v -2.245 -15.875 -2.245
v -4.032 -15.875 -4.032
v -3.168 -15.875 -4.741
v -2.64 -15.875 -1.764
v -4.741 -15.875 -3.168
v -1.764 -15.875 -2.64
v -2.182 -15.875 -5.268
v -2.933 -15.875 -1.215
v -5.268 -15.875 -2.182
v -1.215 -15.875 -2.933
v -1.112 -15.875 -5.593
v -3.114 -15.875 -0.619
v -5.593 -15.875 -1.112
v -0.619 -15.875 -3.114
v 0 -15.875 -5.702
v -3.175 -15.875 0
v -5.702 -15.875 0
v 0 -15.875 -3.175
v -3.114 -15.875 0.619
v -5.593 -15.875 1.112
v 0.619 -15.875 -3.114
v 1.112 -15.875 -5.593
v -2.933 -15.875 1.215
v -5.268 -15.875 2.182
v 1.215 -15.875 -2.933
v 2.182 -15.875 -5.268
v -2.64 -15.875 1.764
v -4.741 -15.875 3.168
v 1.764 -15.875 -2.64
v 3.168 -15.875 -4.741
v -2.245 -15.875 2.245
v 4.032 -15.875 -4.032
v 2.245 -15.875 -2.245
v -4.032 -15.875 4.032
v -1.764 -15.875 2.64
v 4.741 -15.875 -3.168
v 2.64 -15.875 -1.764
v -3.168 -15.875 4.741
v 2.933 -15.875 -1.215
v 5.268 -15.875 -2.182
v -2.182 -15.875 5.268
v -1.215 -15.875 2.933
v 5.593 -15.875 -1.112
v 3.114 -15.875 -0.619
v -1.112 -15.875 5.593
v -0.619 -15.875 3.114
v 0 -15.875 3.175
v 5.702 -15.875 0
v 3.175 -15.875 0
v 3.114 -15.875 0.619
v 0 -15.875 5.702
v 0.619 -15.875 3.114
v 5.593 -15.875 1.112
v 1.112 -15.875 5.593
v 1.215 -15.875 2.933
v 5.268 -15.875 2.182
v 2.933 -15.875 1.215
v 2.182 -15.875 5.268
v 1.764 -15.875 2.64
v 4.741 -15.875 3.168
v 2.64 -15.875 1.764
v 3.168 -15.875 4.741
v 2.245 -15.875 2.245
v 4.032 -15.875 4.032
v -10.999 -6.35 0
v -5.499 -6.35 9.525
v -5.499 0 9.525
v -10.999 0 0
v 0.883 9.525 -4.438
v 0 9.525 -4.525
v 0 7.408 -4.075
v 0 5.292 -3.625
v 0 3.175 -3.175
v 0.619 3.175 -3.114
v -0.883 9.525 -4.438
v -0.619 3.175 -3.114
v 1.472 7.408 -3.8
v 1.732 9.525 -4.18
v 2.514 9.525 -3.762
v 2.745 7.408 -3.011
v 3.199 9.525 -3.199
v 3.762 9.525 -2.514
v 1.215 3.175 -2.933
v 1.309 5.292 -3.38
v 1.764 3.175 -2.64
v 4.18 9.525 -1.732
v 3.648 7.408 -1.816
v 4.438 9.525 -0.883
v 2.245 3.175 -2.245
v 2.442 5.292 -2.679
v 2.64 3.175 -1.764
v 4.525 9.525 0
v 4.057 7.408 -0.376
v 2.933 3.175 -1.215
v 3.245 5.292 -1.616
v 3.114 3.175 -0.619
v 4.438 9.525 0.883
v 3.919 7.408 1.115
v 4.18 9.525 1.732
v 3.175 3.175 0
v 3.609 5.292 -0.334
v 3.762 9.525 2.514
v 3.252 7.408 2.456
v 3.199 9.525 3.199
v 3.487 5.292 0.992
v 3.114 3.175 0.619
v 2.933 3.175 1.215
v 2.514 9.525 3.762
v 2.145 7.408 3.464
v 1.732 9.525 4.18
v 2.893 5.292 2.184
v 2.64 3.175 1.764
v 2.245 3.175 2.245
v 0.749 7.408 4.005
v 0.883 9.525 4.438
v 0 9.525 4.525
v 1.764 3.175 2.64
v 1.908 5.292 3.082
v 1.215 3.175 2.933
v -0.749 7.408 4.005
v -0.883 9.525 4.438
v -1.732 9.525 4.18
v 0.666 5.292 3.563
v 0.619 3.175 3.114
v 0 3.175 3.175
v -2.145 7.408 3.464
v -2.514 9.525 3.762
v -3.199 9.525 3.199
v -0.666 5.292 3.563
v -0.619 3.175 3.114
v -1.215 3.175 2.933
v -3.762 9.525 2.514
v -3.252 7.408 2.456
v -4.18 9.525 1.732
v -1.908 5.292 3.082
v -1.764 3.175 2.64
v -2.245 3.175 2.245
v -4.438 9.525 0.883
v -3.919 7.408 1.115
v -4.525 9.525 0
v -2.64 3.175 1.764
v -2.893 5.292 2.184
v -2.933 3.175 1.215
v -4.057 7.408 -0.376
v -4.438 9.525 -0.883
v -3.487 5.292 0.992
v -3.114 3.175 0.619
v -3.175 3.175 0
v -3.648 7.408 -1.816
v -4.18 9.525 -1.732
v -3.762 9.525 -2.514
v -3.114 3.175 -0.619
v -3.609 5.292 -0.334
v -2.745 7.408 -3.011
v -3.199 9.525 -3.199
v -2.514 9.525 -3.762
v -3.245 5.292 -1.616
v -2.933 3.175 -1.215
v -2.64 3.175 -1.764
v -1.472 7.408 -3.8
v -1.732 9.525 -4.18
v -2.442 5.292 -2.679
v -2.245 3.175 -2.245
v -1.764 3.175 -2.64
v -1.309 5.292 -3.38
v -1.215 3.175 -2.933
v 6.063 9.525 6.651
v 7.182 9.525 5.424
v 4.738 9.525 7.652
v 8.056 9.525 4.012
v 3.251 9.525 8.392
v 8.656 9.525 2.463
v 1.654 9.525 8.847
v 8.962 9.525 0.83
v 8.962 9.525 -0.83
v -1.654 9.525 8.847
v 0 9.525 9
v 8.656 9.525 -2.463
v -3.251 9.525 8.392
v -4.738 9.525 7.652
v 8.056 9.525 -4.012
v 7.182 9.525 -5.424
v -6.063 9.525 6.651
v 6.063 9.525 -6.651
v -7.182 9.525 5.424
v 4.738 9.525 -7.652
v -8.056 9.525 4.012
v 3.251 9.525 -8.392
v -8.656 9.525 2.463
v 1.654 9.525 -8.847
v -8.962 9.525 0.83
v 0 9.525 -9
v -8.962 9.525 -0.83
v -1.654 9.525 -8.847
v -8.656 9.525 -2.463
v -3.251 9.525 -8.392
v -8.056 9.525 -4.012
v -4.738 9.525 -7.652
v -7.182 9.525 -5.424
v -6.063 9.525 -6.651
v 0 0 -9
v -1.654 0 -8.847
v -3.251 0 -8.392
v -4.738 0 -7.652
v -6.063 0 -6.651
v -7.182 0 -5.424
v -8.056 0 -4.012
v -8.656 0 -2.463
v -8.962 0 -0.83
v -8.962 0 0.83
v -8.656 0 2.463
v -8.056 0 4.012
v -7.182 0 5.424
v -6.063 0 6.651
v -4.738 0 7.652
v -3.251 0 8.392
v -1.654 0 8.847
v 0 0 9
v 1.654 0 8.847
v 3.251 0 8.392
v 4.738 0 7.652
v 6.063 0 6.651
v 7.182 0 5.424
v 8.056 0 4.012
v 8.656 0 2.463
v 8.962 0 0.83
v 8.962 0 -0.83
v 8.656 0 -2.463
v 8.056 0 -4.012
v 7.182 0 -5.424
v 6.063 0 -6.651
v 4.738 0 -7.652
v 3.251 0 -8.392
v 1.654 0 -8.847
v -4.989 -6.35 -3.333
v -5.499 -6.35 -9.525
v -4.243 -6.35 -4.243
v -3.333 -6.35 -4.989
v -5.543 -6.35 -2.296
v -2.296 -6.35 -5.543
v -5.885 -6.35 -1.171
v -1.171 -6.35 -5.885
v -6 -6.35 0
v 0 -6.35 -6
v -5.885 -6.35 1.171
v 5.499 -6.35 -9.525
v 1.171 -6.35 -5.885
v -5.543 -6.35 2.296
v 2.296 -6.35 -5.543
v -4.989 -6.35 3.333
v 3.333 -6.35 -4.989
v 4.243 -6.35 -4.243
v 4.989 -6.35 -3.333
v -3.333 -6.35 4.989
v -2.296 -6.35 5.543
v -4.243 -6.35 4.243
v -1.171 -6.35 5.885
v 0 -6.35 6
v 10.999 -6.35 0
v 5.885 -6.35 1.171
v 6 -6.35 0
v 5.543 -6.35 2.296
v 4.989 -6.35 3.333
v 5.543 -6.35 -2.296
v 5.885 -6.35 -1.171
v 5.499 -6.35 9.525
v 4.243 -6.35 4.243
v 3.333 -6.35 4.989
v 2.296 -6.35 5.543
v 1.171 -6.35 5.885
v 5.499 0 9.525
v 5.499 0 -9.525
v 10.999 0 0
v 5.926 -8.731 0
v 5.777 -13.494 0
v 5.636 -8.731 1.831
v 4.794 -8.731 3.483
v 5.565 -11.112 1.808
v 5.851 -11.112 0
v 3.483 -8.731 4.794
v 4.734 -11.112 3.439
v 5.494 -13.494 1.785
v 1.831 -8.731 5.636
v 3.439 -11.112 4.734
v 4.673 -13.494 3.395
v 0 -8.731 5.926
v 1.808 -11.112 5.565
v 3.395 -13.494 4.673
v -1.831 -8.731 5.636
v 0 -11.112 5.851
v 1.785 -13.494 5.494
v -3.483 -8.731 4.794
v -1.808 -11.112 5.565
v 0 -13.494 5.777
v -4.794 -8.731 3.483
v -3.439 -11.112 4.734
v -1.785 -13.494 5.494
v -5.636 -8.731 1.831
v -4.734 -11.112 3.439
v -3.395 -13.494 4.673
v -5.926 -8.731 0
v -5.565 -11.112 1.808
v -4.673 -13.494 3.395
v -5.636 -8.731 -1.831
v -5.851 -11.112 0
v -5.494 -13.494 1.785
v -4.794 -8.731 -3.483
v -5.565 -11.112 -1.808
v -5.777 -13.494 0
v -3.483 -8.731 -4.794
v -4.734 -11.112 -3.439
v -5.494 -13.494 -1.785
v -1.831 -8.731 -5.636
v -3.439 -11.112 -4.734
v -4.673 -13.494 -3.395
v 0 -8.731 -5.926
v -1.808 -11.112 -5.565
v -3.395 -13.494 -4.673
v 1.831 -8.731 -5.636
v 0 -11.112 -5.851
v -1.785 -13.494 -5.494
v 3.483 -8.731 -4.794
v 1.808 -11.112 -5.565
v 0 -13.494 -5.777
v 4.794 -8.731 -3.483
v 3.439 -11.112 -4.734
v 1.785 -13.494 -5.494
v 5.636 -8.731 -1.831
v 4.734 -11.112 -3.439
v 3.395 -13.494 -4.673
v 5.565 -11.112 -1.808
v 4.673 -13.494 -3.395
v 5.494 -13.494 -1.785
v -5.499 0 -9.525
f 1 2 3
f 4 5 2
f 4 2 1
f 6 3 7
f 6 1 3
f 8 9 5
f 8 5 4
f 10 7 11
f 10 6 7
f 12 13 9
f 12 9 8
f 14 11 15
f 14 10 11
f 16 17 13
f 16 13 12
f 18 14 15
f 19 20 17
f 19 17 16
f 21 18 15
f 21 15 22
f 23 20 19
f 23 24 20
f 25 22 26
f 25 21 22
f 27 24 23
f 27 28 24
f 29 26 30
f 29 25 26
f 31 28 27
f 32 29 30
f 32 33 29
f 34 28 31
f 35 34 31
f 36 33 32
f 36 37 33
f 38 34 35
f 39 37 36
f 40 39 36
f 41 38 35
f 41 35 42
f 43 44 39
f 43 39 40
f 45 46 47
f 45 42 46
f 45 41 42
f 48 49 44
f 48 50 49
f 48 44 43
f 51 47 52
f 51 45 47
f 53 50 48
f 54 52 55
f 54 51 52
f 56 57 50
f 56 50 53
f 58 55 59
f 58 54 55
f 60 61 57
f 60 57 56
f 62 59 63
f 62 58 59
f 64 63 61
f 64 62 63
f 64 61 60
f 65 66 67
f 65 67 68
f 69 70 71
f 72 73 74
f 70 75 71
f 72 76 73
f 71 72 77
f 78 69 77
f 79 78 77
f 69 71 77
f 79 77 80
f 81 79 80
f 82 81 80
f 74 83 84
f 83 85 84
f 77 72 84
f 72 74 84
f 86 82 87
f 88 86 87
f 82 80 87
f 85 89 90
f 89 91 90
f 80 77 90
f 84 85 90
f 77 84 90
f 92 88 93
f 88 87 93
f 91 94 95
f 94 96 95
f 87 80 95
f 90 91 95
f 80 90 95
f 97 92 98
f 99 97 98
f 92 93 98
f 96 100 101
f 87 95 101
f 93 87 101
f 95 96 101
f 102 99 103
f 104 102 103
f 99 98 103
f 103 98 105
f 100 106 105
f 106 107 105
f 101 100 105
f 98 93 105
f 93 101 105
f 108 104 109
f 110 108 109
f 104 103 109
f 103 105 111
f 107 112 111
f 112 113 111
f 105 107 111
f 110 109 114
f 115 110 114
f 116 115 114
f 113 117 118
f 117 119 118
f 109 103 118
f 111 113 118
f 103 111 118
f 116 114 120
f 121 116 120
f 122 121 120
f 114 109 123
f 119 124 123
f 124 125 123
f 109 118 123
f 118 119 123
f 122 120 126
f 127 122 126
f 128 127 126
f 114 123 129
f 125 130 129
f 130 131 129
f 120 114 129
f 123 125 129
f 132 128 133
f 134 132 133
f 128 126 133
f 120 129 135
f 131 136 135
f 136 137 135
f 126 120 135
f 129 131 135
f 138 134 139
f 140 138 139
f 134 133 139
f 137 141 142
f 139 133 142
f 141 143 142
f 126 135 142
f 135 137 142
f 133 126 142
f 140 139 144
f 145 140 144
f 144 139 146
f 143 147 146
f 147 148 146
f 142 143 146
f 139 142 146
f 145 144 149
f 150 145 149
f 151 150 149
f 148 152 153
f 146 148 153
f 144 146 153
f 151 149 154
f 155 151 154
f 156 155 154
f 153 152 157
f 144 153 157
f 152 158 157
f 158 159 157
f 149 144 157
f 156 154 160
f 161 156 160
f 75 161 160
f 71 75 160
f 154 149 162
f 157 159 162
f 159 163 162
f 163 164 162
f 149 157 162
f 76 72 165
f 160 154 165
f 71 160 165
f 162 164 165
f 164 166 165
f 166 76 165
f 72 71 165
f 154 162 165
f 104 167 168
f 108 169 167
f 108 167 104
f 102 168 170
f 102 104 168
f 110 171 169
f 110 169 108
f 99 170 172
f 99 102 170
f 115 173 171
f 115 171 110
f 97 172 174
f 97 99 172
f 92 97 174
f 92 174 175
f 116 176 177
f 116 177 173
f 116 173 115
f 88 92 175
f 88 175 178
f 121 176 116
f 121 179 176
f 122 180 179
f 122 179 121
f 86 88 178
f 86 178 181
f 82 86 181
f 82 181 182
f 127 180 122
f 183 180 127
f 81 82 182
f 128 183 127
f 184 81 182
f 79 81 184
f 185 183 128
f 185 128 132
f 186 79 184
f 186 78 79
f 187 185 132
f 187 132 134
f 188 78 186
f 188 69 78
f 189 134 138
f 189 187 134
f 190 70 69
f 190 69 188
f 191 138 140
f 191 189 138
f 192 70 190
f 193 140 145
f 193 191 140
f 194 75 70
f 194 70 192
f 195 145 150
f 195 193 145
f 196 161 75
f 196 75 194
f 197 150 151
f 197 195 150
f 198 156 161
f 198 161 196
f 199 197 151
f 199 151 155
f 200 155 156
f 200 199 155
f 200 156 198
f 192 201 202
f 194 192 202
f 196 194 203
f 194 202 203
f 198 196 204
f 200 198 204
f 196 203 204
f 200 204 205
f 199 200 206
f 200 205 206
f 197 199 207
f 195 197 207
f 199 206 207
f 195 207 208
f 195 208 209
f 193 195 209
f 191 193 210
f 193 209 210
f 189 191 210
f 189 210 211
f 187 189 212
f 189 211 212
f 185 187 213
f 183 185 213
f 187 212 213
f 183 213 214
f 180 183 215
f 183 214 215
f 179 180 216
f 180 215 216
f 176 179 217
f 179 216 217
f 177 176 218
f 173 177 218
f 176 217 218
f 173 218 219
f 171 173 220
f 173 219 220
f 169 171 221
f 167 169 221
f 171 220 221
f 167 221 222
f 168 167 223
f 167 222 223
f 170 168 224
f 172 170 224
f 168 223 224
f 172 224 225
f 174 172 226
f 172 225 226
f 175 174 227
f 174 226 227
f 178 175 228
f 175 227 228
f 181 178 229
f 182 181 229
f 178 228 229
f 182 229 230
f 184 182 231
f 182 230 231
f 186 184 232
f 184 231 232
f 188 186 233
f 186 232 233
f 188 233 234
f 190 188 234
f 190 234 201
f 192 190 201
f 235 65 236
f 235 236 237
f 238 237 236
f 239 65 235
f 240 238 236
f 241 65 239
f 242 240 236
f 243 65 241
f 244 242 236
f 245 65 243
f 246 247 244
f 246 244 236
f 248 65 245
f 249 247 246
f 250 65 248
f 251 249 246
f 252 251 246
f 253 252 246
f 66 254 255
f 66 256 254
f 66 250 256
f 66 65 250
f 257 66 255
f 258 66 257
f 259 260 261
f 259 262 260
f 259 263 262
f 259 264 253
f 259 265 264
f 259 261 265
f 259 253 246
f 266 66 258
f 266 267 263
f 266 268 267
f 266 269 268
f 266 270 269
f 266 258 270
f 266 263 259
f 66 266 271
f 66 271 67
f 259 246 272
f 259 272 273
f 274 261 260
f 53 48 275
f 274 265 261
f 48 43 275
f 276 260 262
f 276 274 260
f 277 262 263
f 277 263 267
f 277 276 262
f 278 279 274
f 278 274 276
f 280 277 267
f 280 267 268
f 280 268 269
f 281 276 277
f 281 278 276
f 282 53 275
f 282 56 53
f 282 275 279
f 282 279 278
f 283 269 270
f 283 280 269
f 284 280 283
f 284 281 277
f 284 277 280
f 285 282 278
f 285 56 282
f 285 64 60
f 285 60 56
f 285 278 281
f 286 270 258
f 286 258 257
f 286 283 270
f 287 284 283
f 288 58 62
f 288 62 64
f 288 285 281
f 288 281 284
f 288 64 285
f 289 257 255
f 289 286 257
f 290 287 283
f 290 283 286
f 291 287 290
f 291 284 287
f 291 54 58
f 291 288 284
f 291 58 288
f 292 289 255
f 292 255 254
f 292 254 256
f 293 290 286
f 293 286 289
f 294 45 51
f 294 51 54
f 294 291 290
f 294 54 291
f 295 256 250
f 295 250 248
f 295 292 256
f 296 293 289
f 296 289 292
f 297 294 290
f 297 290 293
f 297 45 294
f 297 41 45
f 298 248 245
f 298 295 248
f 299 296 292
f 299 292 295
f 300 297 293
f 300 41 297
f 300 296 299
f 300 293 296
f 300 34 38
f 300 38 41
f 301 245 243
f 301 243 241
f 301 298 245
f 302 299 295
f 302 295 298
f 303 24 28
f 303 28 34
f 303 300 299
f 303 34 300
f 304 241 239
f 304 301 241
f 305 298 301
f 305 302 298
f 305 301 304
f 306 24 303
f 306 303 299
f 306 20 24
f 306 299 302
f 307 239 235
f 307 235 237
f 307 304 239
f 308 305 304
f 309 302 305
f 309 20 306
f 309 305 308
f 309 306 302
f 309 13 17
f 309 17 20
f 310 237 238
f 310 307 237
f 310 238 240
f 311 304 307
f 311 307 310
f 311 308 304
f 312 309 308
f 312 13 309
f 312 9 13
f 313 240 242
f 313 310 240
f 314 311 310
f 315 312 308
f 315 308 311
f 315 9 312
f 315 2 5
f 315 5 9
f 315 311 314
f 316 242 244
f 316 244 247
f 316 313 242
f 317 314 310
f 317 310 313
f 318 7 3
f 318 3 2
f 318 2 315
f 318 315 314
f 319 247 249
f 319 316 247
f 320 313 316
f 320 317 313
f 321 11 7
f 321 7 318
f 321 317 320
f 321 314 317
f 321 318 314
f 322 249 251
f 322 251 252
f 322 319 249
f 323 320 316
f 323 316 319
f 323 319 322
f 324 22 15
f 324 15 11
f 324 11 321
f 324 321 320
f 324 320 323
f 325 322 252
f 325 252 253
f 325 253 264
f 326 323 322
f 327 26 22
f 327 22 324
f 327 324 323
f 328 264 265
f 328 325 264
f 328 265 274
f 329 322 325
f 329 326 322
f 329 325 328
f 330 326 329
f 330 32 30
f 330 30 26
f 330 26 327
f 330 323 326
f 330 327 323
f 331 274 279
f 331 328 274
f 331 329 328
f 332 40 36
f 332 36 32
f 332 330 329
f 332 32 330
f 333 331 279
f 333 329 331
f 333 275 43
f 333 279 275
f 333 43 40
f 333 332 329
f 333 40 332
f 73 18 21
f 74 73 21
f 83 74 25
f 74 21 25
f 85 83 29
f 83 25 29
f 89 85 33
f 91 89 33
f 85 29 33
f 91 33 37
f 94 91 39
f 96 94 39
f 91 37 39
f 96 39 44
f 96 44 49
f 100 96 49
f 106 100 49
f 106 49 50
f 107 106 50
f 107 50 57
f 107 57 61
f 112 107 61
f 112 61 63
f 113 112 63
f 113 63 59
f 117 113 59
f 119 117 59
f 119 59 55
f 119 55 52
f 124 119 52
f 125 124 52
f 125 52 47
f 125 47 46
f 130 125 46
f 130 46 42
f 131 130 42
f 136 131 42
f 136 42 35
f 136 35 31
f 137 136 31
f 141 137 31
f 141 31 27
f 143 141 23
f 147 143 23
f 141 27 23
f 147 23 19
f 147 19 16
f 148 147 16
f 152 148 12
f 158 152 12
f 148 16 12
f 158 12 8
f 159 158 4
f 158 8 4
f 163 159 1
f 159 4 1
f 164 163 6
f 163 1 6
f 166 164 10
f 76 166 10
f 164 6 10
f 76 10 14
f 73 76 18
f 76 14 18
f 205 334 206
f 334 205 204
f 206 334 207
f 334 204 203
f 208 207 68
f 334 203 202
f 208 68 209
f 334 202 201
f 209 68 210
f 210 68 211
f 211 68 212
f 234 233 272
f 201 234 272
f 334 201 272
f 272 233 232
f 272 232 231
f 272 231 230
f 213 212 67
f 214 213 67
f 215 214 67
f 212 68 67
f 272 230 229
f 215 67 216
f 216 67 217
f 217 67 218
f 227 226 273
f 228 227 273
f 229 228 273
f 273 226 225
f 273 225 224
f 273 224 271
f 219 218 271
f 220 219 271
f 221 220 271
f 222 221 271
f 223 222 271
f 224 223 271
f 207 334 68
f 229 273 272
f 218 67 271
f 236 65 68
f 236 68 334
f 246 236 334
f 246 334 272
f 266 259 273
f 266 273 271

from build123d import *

# Parameters (mm, degrees)
SKETCH1_R           = 9
BOSS_EXTRUDE1_DEPTH = 9.525
SKETCH4_R           = 3.175
CUT_EXTRUDE1_DEPTH  = 3.175
SKETCH5_R           = 3.175
CUT_EXTRUDE2_DEPTH  = 15.224011389
CUT_EXTRUDE2_DRAFT  = 12
BOSS_EXTRUDE3_START = 6.35
SKETCH6_R           = 3.175
BOSS_EXTRUDE3_DEPTH = 6.35
SKETCH7_R           = 6
BOSS_EXTRUDE4_DEPTH = 9.525
BOSS_EXTRUDE4_TAPER = 1.79
SKETCH8_R           = 3.175
CUT_EXTRUDE3_DEPTH  = 30.272053652


with BuildPart() as part:
    # Sketch1 → Boss-Extrude1 (new body)
    with BuildSketch(Plane(origin=(0, 0, 0), x_dir=(1, 0, 0), z_dir=(0, 1, 0))):
        with Locations(Location((0, 0, 0), (0, 0, 90))):
            Circle(SKETCH1_R)
    extrude(amount=BOSS_EXTRUDE1_DEPTH)

    # Sketch4 → Cut-Extrude1 (cut)
    with BuildSketch(Plane.XZ):
        with Locations(Location((0, 0, 0), (0, 0, 270))):
            Circle(SKETCH4_R)
    extrude(amount=-CUT_EXTRUDE1_DEPTH, mode=Mode.SUBTRACT)


with BuildPart() as cut_extrude2_tool:
    # Sketch5 → Cut-Extrude2 (with draft: the straight prism first)
    with BuildSketch(Plane(origin=(0, 3.175, 0), x_dir=(-1, 0, 0), z_dir=(0, -1, 0))):
        with Locations(Location((0, 0, 0), (0, 0, 90))):
            Circle(SKETCH5_R)
    extrude(amount=-CUT_EXTRUDE2_DEPTH)
    # Cut-Extrude2: the draft: its side faces are tilted about the plane it starts from
    cut_extrude2_sides = [cut_extrude2_tool.faces().sort_by_distance(p)[0] for p in [
        (0, 10.787005695, 3.175),
    ]]
    draft(cut_extrude2_sides, Plane(origin=(0, 3.175, 0), x_dir=(-1, 0, 0), z_dir=(0, -1, 0)), CUT_EXTRUDE2_DRAFT)


with BuildPart() as part_1:
    add(part.part)

    # Cut-Extrude2: cut by cut_extrude2_tool
    add(cut_extrude2_tool.part, mode=Mode.SUBTRACT)

    # Sketch6 → Boss-Extrude3 (add)
    with BuildSketch(Plane.XZ.offset(BOSS_EXTRUDE3_START)):
        Polygon((-10.998522628, 0), (-5.499261314, -9.525), (5.499261314, -9.525), (10.998522628, 0), (5.499261314, 9.525), (-5.499261314, 9.525), align=None)
        with Locations(Location((0, 0, 0), (0, 0, 270))):
            Circle(SKETCH6_R, mode=Mode.SUBTRACT)
    extrude(amount=-BOSS_EXTRUDE3_DEPTH)

    # Sketch7 → Boss-Extrude4 (add)
    with BuildSketch(Plane.XZ.offset(6.35)):
        Circle(SKETCH7_R)
    extrude(amount=BOSS_EXTRUDE4_DEPTH, taper=BOSS_EXTRUDE4_TAPER)

    # Sketch8 → Cut-Extrude3 (cut, through all)
    with BuildSketch(Plane.XZ.offset(15.875)):
        with Locations(Location((0, 0, 0), (0, 0, 270))):
            Circle(SKETCH8_R)
    extrude(amount=-CUT_EXTRUDE3_DEPTH, mode=Mode.SUBTRACT)


solid = part_1.part
